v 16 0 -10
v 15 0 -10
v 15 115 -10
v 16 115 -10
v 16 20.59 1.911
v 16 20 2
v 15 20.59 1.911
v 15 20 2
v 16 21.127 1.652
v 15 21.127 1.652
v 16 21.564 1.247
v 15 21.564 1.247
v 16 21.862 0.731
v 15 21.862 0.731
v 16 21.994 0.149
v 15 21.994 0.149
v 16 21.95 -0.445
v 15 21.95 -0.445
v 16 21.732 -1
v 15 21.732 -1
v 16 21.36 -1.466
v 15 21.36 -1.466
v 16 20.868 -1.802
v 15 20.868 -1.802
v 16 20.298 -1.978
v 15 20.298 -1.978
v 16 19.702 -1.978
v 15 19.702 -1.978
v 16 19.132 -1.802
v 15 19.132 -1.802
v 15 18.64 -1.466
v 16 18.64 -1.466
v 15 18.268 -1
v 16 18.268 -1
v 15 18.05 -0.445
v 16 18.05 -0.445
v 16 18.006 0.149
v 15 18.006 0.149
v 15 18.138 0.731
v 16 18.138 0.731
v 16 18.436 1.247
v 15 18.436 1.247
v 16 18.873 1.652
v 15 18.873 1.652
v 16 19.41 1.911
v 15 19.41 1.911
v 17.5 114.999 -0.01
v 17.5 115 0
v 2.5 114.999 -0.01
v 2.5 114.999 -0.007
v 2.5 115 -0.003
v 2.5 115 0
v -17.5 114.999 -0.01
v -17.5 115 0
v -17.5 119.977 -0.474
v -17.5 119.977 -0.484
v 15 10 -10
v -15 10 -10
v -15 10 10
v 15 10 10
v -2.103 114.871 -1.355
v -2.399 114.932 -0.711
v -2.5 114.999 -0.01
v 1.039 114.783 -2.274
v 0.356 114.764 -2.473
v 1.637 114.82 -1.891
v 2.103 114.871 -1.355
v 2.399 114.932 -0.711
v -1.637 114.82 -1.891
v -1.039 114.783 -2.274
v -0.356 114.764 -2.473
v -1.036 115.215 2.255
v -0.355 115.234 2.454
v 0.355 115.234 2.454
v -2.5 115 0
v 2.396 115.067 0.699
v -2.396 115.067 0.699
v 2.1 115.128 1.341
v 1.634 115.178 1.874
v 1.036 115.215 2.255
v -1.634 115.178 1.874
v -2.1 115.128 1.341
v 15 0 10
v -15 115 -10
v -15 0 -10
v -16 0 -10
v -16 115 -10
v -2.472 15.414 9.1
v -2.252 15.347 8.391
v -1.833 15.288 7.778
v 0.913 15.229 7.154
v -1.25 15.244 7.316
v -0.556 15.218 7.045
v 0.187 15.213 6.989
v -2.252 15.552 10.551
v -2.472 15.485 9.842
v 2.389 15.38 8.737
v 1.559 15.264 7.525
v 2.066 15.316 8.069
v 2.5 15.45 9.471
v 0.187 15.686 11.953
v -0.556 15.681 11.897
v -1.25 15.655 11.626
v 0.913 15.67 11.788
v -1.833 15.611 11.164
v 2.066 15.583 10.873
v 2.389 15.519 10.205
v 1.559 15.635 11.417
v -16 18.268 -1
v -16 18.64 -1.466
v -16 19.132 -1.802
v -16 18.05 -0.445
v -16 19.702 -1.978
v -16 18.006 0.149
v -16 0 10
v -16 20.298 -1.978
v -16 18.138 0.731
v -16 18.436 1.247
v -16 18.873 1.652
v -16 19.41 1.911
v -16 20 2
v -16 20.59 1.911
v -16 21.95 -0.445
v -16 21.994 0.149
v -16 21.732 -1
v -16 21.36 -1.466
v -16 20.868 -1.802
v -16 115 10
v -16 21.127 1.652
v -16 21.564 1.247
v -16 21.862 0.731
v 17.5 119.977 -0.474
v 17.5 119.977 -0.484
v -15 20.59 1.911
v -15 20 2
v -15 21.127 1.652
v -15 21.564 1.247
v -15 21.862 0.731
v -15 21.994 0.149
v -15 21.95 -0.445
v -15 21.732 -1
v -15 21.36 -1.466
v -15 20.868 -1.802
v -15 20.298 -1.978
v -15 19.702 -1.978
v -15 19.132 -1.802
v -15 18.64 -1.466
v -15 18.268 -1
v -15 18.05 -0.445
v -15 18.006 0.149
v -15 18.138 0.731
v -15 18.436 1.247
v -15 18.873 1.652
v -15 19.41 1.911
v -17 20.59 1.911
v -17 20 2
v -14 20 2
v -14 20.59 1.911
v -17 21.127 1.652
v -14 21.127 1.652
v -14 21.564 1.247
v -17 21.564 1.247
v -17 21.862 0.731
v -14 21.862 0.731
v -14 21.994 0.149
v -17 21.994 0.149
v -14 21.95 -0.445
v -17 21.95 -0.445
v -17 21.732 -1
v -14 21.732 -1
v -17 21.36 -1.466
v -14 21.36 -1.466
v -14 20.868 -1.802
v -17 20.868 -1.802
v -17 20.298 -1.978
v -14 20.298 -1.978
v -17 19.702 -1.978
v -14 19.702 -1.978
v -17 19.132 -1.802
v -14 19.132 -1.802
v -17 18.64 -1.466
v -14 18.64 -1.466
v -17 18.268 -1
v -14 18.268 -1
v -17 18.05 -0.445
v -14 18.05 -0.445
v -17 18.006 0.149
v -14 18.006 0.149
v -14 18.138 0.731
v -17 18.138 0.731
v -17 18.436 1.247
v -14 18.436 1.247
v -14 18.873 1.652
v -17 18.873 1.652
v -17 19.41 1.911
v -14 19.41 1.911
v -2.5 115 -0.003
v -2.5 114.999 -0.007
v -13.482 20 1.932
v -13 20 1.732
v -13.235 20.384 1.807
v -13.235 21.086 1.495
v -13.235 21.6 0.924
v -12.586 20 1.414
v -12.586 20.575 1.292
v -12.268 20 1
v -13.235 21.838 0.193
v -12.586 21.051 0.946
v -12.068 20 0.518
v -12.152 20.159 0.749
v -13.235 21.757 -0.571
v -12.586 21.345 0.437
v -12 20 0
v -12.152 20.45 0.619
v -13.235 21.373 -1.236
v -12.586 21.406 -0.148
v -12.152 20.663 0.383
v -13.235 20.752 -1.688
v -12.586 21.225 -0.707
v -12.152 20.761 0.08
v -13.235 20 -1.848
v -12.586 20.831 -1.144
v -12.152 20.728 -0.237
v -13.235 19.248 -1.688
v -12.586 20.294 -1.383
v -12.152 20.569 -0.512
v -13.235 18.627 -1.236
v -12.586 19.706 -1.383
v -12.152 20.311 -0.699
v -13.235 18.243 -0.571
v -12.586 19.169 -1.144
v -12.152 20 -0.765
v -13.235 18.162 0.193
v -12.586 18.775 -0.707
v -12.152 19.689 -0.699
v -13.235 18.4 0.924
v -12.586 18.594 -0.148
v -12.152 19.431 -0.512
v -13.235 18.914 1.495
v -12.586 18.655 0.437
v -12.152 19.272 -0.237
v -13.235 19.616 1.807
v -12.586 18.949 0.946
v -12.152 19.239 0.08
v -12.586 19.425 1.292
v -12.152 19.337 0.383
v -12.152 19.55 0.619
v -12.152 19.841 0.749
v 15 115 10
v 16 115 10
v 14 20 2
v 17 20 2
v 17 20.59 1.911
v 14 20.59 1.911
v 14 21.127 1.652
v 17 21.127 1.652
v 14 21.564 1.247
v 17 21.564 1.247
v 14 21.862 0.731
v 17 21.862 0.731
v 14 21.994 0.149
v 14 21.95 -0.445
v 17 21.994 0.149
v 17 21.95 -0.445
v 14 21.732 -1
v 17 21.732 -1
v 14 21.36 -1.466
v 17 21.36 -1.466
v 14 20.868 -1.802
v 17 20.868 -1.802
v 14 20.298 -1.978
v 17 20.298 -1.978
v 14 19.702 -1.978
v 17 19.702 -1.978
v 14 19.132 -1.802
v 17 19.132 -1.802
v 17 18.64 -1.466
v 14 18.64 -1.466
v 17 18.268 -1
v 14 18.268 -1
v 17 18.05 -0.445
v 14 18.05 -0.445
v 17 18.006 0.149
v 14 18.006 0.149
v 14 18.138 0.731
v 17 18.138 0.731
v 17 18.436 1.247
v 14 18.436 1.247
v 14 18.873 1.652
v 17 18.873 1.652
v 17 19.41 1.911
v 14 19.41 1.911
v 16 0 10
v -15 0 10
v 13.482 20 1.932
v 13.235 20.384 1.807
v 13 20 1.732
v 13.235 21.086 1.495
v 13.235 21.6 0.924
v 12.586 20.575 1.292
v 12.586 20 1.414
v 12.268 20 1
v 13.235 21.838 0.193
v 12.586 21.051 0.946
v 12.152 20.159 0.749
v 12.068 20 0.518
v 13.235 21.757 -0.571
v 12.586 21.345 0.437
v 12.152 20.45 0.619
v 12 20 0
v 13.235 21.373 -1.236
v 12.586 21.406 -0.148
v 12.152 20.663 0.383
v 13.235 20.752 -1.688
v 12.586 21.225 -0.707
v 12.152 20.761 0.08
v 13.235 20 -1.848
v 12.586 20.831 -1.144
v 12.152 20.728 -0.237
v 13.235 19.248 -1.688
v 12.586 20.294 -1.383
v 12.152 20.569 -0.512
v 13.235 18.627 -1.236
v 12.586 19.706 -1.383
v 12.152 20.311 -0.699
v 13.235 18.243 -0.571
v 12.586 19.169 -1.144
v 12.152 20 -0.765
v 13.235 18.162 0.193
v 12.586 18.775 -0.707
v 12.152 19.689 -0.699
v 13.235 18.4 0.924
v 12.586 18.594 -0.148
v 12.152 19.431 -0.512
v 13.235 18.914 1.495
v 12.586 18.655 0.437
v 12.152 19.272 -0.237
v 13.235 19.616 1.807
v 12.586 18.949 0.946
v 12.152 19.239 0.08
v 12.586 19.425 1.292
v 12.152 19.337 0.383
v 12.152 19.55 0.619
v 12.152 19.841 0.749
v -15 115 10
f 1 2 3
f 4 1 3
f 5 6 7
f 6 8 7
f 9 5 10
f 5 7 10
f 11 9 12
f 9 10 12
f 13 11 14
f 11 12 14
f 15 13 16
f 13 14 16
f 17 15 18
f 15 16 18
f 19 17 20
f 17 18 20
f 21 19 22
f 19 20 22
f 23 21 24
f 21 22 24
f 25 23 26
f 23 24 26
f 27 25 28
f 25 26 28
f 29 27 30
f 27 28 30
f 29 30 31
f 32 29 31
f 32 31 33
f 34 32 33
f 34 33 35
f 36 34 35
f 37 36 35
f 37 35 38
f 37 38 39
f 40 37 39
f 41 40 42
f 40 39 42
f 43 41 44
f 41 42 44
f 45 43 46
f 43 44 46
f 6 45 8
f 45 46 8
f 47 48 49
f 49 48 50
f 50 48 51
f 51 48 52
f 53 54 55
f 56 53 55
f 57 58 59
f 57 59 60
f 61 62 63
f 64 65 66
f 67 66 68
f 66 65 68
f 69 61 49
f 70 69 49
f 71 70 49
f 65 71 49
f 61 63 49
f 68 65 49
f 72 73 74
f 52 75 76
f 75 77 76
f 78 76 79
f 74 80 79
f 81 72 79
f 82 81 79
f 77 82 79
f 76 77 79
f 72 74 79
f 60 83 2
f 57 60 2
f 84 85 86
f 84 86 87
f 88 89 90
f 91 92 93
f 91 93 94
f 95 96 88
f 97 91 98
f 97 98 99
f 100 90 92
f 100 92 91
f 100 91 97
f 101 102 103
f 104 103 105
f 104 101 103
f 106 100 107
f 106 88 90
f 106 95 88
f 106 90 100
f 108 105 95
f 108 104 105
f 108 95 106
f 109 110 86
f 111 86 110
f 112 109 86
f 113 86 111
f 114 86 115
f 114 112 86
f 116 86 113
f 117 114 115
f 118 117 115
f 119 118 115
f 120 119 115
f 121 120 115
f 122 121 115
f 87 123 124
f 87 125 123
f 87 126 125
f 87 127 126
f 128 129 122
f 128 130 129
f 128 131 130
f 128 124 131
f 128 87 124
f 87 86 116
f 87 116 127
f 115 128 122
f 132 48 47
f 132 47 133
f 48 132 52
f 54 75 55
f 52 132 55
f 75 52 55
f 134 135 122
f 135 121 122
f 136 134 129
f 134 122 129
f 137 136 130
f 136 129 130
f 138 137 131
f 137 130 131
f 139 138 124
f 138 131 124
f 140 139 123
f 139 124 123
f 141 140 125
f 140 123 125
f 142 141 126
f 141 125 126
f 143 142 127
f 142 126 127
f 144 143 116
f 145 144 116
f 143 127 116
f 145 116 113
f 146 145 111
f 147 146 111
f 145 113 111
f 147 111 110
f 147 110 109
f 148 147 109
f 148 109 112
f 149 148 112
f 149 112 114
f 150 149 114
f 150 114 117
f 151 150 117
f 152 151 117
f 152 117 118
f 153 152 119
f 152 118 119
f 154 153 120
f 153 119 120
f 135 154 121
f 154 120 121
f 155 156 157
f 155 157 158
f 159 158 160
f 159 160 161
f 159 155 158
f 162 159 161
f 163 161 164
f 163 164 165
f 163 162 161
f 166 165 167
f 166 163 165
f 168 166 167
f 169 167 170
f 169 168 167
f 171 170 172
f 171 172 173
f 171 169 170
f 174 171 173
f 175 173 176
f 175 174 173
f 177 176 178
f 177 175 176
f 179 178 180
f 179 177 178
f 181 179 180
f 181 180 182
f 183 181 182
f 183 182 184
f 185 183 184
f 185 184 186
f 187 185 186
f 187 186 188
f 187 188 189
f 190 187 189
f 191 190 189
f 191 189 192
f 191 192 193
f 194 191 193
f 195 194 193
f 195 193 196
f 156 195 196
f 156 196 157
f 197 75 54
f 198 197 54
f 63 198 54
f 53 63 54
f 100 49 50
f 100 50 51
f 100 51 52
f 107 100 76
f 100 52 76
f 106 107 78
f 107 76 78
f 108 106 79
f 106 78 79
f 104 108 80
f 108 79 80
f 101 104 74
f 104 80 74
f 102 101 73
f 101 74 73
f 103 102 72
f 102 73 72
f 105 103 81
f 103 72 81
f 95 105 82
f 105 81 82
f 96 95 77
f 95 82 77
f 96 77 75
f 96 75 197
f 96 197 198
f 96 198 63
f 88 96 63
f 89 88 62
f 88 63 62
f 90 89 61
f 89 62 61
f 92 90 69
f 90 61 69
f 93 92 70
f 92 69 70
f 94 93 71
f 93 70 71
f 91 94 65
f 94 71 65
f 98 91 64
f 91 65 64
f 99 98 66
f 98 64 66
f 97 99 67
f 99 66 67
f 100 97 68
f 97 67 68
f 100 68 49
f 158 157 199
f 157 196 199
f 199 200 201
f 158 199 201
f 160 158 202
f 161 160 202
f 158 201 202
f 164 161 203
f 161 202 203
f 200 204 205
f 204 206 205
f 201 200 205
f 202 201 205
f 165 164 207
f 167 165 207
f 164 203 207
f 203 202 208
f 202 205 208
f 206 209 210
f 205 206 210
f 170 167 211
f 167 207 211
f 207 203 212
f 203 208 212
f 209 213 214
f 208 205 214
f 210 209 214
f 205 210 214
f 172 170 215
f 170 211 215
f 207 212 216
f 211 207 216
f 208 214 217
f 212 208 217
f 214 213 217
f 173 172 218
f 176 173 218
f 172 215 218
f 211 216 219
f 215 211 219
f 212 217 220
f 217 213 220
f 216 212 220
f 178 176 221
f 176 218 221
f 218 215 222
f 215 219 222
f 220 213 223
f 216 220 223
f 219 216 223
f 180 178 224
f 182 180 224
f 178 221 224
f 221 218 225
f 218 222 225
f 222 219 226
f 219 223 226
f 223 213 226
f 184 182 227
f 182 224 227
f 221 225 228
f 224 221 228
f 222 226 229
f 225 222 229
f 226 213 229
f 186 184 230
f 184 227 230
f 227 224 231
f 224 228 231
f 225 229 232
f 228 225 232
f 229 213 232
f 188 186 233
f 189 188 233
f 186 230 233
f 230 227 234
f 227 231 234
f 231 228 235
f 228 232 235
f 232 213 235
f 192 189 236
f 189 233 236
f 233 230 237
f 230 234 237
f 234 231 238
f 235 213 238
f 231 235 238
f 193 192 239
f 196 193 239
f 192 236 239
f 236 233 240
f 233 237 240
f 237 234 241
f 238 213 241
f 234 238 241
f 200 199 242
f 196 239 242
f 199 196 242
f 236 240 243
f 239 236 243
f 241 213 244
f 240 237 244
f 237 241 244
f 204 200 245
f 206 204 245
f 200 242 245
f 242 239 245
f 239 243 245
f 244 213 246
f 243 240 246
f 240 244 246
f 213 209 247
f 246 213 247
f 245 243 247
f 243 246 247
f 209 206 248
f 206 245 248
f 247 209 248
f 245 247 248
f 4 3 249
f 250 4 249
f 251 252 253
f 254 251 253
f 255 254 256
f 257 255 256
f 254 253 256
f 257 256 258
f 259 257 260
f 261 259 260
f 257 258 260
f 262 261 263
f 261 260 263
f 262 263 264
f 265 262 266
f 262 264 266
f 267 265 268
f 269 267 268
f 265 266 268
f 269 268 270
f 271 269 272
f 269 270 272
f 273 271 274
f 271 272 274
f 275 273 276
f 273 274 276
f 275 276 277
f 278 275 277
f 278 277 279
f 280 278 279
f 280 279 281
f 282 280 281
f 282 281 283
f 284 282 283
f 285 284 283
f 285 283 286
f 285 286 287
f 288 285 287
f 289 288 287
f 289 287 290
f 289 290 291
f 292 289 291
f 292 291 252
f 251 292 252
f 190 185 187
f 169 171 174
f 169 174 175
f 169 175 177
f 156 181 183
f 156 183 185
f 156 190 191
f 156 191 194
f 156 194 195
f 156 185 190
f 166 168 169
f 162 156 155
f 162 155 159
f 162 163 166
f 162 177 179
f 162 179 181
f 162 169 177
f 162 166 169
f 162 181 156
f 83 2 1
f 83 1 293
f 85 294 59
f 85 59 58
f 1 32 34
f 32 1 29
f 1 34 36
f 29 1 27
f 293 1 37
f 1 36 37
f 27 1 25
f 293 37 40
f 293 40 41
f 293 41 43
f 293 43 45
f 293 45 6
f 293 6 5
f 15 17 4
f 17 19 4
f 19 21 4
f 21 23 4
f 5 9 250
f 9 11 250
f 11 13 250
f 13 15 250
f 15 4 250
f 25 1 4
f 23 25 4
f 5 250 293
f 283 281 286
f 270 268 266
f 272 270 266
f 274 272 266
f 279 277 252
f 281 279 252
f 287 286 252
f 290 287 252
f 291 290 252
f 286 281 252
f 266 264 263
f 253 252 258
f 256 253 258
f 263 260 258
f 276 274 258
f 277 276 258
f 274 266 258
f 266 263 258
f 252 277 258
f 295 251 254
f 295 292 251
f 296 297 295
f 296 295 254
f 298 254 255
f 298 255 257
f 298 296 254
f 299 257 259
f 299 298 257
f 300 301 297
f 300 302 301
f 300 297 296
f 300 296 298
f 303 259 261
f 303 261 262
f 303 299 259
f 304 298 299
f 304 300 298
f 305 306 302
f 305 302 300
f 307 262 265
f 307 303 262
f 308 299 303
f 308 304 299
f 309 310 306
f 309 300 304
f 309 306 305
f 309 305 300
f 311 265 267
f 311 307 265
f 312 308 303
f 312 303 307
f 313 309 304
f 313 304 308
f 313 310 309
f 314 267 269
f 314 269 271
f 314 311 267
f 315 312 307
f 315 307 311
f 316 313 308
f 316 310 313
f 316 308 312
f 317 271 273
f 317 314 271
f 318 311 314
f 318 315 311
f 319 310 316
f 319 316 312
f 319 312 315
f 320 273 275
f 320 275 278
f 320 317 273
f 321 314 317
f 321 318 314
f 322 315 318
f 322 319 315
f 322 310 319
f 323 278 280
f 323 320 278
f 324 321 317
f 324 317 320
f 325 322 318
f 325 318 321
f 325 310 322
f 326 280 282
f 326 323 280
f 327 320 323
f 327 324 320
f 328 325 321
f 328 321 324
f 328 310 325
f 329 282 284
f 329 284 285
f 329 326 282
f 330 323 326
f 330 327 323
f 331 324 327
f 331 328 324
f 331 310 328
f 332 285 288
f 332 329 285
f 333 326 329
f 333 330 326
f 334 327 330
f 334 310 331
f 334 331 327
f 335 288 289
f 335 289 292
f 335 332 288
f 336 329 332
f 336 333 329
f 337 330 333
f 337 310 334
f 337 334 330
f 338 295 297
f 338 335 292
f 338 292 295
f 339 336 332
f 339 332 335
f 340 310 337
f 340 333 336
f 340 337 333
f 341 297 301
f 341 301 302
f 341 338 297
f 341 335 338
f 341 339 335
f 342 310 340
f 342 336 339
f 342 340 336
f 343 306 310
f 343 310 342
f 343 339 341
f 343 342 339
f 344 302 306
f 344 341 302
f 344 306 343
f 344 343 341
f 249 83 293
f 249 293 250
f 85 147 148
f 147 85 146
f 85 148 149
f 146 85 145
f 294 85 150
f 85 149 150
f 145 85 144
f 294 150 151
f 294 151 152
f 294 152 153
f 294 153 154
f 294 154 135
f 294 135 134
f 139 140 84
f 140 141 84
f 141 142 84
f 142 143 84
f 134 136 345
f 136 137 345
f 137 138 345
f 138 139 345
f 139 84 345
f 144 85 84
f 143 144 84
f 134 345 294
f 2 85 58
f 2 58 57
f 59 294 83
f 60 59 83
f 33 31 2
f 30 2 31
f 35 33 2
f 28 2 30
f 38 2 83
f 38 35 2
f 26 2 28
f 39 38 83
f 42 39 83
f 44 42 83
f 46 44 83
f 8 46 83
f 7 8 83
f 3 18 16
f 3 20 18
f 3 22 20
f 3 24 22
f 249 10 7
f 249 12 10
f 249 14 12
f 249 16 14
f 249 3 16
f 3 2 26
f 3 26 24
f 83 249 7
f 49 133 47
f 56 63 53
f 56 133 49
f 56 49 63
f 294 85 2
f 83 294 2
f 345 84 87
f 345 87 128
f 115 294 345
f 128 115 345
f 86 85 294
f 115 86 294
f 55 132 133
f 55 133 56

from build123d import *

# Parameters (mm, degrees)
SKETCH1_W                = 30
SKETCH1_H                = 20
BOSS_EXTRUDE1_DEPTH      = 10
SKETCH2_W                = 20
SKETCH2_H                = 115
BOSS_EXTRUDE2_DEPTH      = 1
SKETCH3_R                = 2
BOSS_EXTRUDE6_DEPTH      = 1
BOSS_EXTRUDE6_DEPTH_BACK = 4
FILLET1_R                = 2
SKETCH6_W                = 35
SKETCH6_H                = 5
BOSS_EXTRUDE3_DEPTH      = 0.01
SKETCH7_R                = 2.5
BOSS_EXTRUDE5_DEPTH      = 100
SKETCH8_R                = 2
CUT_EXTRUDE2_DEPTH       = 2.5
CUT_EXTRUDE2_DEPTH_BACK  = 34.5


with BuildPart() as part:
    # Sketch1 → Boss-Extrude1 (new body)
    with BuildSketch(Plane(origin=(0, 0, 0), x_dir=(1, 0, 0), z_dir=(0, 1, 0))):
        Rectangle(SKETCH1_W, SKETCH1_H)
    extrude(amount=BOSS_EXTRUDE1_DEPTH)


with BuildPart() as body_2:
    # Sketch2 → Boss-Extrude2 (new body)
    with BuildSketch(Plane.ZY.offset(15)):
        with Locations((0, 57.5)):
            Rectangle(SKETCH2_W, SKETCH2_H)
    extrude(amount=BOSS_EXTRUDE2_DEPTH)


with BuildPart() as body_3:
    # Sketch3 → Boss-Extrude6 (new body, two sides)
    with BuildSketch(Plane.ZY.offset(16)) as boss_extrude6_sk:
        with Locations((0, 20)):
            Circle(SKETCH3_R)
    extrude(amount=BOSS_EXTRUDE6_DEPTH)
    extrude(boss_extrude6_sk.sketch, amount=-BOSS_EXTRUDE6_DEPTH_BACK)

    # Fillet1
    fillet1_edges = [body_3.edges().sort_by_distance(p)[0] for p in [
        (-12, 20, -2),
    ]]
    fillet(fillet1_edges, radius=FILLET1_R)


with BuildPart() as body_4:
    # Mirror3: mirrored copy
    add(body_2.part.mirror(Plane(origin=(0, 0, 0), x_dir=(0, 0, 1), z_dir=(1, 0, 0))))


with BuildPart() as body_5:
    # Mirror3 2: mirrored copy
    add(body_3.part.mirror(Plane(origin=(0, 0, 0), x_dir=(0, 0, 1), z_dir=(1, 0, 0))))


with BuildPart() as body_6:
    # Sketch6 → Boss-Extrude3 (new body)
    with BuildSketch(Plane(origin=(0, 1.033707865, 10.853932584), x_dir=(-1, 0, 0), z_dir=(0, -0.094809093, -0.995495473))):
        with Locations((0, 116.981979348)):
            Rectangle(SKETCH6_W, SKETCH6_H)
    extrude(amount=BOSS_EXTRUDE3_DEPTH)

    # Sketch7 → Boss-Extrude5 (add)
    with BuildSketch(Plane(origin=(0, 113.966292135, -10.853932584), x_dir=(1, 0, 0), z_dir=(0, -0.995495473, 0.094809093))):
        with Locations((0, 10.893045652)):
            Circle(SKETCH7_R)
    extrude(amount=BOSS_EXTRUDE5_DEPTH)


with BuildPart() as cut_extrude2_tool:
    # Sketch8 → Cut-Extrude2 (new body, two sides)
    with BuildSketch(Plane.ZY.offset(16)) as cut_extrude2_sk:
        with Locations((0, 20)):
            Circle(SKETCH8_R)
    extrude(amount=CUT_EXTRUDE2_DEPTH)
    extrude(cut_extrude2_sk.sketch, amount=-CUT_EXTRUDE2_DEPTH_BACK)


with BuildPart() as body_2_1:
    add(body_2.part)

    # Cut-Extrude2: cut by cut_extrude2_tool
    add(cut_extrude2_tool.part, mode=Mode.SUBTRACT)


with BuildPart() as body_4_1:
    add(body_4.part)

    # Cut-Extrude2: cut by cut_extrude2_tool
    add(cut_extrude2_tool.part, mode=Mode.SUBTRACT)


solid = Compound([part.part, body_3.part, body_5.part, body_6.part, body_2_1.part, body_4_1.part])
